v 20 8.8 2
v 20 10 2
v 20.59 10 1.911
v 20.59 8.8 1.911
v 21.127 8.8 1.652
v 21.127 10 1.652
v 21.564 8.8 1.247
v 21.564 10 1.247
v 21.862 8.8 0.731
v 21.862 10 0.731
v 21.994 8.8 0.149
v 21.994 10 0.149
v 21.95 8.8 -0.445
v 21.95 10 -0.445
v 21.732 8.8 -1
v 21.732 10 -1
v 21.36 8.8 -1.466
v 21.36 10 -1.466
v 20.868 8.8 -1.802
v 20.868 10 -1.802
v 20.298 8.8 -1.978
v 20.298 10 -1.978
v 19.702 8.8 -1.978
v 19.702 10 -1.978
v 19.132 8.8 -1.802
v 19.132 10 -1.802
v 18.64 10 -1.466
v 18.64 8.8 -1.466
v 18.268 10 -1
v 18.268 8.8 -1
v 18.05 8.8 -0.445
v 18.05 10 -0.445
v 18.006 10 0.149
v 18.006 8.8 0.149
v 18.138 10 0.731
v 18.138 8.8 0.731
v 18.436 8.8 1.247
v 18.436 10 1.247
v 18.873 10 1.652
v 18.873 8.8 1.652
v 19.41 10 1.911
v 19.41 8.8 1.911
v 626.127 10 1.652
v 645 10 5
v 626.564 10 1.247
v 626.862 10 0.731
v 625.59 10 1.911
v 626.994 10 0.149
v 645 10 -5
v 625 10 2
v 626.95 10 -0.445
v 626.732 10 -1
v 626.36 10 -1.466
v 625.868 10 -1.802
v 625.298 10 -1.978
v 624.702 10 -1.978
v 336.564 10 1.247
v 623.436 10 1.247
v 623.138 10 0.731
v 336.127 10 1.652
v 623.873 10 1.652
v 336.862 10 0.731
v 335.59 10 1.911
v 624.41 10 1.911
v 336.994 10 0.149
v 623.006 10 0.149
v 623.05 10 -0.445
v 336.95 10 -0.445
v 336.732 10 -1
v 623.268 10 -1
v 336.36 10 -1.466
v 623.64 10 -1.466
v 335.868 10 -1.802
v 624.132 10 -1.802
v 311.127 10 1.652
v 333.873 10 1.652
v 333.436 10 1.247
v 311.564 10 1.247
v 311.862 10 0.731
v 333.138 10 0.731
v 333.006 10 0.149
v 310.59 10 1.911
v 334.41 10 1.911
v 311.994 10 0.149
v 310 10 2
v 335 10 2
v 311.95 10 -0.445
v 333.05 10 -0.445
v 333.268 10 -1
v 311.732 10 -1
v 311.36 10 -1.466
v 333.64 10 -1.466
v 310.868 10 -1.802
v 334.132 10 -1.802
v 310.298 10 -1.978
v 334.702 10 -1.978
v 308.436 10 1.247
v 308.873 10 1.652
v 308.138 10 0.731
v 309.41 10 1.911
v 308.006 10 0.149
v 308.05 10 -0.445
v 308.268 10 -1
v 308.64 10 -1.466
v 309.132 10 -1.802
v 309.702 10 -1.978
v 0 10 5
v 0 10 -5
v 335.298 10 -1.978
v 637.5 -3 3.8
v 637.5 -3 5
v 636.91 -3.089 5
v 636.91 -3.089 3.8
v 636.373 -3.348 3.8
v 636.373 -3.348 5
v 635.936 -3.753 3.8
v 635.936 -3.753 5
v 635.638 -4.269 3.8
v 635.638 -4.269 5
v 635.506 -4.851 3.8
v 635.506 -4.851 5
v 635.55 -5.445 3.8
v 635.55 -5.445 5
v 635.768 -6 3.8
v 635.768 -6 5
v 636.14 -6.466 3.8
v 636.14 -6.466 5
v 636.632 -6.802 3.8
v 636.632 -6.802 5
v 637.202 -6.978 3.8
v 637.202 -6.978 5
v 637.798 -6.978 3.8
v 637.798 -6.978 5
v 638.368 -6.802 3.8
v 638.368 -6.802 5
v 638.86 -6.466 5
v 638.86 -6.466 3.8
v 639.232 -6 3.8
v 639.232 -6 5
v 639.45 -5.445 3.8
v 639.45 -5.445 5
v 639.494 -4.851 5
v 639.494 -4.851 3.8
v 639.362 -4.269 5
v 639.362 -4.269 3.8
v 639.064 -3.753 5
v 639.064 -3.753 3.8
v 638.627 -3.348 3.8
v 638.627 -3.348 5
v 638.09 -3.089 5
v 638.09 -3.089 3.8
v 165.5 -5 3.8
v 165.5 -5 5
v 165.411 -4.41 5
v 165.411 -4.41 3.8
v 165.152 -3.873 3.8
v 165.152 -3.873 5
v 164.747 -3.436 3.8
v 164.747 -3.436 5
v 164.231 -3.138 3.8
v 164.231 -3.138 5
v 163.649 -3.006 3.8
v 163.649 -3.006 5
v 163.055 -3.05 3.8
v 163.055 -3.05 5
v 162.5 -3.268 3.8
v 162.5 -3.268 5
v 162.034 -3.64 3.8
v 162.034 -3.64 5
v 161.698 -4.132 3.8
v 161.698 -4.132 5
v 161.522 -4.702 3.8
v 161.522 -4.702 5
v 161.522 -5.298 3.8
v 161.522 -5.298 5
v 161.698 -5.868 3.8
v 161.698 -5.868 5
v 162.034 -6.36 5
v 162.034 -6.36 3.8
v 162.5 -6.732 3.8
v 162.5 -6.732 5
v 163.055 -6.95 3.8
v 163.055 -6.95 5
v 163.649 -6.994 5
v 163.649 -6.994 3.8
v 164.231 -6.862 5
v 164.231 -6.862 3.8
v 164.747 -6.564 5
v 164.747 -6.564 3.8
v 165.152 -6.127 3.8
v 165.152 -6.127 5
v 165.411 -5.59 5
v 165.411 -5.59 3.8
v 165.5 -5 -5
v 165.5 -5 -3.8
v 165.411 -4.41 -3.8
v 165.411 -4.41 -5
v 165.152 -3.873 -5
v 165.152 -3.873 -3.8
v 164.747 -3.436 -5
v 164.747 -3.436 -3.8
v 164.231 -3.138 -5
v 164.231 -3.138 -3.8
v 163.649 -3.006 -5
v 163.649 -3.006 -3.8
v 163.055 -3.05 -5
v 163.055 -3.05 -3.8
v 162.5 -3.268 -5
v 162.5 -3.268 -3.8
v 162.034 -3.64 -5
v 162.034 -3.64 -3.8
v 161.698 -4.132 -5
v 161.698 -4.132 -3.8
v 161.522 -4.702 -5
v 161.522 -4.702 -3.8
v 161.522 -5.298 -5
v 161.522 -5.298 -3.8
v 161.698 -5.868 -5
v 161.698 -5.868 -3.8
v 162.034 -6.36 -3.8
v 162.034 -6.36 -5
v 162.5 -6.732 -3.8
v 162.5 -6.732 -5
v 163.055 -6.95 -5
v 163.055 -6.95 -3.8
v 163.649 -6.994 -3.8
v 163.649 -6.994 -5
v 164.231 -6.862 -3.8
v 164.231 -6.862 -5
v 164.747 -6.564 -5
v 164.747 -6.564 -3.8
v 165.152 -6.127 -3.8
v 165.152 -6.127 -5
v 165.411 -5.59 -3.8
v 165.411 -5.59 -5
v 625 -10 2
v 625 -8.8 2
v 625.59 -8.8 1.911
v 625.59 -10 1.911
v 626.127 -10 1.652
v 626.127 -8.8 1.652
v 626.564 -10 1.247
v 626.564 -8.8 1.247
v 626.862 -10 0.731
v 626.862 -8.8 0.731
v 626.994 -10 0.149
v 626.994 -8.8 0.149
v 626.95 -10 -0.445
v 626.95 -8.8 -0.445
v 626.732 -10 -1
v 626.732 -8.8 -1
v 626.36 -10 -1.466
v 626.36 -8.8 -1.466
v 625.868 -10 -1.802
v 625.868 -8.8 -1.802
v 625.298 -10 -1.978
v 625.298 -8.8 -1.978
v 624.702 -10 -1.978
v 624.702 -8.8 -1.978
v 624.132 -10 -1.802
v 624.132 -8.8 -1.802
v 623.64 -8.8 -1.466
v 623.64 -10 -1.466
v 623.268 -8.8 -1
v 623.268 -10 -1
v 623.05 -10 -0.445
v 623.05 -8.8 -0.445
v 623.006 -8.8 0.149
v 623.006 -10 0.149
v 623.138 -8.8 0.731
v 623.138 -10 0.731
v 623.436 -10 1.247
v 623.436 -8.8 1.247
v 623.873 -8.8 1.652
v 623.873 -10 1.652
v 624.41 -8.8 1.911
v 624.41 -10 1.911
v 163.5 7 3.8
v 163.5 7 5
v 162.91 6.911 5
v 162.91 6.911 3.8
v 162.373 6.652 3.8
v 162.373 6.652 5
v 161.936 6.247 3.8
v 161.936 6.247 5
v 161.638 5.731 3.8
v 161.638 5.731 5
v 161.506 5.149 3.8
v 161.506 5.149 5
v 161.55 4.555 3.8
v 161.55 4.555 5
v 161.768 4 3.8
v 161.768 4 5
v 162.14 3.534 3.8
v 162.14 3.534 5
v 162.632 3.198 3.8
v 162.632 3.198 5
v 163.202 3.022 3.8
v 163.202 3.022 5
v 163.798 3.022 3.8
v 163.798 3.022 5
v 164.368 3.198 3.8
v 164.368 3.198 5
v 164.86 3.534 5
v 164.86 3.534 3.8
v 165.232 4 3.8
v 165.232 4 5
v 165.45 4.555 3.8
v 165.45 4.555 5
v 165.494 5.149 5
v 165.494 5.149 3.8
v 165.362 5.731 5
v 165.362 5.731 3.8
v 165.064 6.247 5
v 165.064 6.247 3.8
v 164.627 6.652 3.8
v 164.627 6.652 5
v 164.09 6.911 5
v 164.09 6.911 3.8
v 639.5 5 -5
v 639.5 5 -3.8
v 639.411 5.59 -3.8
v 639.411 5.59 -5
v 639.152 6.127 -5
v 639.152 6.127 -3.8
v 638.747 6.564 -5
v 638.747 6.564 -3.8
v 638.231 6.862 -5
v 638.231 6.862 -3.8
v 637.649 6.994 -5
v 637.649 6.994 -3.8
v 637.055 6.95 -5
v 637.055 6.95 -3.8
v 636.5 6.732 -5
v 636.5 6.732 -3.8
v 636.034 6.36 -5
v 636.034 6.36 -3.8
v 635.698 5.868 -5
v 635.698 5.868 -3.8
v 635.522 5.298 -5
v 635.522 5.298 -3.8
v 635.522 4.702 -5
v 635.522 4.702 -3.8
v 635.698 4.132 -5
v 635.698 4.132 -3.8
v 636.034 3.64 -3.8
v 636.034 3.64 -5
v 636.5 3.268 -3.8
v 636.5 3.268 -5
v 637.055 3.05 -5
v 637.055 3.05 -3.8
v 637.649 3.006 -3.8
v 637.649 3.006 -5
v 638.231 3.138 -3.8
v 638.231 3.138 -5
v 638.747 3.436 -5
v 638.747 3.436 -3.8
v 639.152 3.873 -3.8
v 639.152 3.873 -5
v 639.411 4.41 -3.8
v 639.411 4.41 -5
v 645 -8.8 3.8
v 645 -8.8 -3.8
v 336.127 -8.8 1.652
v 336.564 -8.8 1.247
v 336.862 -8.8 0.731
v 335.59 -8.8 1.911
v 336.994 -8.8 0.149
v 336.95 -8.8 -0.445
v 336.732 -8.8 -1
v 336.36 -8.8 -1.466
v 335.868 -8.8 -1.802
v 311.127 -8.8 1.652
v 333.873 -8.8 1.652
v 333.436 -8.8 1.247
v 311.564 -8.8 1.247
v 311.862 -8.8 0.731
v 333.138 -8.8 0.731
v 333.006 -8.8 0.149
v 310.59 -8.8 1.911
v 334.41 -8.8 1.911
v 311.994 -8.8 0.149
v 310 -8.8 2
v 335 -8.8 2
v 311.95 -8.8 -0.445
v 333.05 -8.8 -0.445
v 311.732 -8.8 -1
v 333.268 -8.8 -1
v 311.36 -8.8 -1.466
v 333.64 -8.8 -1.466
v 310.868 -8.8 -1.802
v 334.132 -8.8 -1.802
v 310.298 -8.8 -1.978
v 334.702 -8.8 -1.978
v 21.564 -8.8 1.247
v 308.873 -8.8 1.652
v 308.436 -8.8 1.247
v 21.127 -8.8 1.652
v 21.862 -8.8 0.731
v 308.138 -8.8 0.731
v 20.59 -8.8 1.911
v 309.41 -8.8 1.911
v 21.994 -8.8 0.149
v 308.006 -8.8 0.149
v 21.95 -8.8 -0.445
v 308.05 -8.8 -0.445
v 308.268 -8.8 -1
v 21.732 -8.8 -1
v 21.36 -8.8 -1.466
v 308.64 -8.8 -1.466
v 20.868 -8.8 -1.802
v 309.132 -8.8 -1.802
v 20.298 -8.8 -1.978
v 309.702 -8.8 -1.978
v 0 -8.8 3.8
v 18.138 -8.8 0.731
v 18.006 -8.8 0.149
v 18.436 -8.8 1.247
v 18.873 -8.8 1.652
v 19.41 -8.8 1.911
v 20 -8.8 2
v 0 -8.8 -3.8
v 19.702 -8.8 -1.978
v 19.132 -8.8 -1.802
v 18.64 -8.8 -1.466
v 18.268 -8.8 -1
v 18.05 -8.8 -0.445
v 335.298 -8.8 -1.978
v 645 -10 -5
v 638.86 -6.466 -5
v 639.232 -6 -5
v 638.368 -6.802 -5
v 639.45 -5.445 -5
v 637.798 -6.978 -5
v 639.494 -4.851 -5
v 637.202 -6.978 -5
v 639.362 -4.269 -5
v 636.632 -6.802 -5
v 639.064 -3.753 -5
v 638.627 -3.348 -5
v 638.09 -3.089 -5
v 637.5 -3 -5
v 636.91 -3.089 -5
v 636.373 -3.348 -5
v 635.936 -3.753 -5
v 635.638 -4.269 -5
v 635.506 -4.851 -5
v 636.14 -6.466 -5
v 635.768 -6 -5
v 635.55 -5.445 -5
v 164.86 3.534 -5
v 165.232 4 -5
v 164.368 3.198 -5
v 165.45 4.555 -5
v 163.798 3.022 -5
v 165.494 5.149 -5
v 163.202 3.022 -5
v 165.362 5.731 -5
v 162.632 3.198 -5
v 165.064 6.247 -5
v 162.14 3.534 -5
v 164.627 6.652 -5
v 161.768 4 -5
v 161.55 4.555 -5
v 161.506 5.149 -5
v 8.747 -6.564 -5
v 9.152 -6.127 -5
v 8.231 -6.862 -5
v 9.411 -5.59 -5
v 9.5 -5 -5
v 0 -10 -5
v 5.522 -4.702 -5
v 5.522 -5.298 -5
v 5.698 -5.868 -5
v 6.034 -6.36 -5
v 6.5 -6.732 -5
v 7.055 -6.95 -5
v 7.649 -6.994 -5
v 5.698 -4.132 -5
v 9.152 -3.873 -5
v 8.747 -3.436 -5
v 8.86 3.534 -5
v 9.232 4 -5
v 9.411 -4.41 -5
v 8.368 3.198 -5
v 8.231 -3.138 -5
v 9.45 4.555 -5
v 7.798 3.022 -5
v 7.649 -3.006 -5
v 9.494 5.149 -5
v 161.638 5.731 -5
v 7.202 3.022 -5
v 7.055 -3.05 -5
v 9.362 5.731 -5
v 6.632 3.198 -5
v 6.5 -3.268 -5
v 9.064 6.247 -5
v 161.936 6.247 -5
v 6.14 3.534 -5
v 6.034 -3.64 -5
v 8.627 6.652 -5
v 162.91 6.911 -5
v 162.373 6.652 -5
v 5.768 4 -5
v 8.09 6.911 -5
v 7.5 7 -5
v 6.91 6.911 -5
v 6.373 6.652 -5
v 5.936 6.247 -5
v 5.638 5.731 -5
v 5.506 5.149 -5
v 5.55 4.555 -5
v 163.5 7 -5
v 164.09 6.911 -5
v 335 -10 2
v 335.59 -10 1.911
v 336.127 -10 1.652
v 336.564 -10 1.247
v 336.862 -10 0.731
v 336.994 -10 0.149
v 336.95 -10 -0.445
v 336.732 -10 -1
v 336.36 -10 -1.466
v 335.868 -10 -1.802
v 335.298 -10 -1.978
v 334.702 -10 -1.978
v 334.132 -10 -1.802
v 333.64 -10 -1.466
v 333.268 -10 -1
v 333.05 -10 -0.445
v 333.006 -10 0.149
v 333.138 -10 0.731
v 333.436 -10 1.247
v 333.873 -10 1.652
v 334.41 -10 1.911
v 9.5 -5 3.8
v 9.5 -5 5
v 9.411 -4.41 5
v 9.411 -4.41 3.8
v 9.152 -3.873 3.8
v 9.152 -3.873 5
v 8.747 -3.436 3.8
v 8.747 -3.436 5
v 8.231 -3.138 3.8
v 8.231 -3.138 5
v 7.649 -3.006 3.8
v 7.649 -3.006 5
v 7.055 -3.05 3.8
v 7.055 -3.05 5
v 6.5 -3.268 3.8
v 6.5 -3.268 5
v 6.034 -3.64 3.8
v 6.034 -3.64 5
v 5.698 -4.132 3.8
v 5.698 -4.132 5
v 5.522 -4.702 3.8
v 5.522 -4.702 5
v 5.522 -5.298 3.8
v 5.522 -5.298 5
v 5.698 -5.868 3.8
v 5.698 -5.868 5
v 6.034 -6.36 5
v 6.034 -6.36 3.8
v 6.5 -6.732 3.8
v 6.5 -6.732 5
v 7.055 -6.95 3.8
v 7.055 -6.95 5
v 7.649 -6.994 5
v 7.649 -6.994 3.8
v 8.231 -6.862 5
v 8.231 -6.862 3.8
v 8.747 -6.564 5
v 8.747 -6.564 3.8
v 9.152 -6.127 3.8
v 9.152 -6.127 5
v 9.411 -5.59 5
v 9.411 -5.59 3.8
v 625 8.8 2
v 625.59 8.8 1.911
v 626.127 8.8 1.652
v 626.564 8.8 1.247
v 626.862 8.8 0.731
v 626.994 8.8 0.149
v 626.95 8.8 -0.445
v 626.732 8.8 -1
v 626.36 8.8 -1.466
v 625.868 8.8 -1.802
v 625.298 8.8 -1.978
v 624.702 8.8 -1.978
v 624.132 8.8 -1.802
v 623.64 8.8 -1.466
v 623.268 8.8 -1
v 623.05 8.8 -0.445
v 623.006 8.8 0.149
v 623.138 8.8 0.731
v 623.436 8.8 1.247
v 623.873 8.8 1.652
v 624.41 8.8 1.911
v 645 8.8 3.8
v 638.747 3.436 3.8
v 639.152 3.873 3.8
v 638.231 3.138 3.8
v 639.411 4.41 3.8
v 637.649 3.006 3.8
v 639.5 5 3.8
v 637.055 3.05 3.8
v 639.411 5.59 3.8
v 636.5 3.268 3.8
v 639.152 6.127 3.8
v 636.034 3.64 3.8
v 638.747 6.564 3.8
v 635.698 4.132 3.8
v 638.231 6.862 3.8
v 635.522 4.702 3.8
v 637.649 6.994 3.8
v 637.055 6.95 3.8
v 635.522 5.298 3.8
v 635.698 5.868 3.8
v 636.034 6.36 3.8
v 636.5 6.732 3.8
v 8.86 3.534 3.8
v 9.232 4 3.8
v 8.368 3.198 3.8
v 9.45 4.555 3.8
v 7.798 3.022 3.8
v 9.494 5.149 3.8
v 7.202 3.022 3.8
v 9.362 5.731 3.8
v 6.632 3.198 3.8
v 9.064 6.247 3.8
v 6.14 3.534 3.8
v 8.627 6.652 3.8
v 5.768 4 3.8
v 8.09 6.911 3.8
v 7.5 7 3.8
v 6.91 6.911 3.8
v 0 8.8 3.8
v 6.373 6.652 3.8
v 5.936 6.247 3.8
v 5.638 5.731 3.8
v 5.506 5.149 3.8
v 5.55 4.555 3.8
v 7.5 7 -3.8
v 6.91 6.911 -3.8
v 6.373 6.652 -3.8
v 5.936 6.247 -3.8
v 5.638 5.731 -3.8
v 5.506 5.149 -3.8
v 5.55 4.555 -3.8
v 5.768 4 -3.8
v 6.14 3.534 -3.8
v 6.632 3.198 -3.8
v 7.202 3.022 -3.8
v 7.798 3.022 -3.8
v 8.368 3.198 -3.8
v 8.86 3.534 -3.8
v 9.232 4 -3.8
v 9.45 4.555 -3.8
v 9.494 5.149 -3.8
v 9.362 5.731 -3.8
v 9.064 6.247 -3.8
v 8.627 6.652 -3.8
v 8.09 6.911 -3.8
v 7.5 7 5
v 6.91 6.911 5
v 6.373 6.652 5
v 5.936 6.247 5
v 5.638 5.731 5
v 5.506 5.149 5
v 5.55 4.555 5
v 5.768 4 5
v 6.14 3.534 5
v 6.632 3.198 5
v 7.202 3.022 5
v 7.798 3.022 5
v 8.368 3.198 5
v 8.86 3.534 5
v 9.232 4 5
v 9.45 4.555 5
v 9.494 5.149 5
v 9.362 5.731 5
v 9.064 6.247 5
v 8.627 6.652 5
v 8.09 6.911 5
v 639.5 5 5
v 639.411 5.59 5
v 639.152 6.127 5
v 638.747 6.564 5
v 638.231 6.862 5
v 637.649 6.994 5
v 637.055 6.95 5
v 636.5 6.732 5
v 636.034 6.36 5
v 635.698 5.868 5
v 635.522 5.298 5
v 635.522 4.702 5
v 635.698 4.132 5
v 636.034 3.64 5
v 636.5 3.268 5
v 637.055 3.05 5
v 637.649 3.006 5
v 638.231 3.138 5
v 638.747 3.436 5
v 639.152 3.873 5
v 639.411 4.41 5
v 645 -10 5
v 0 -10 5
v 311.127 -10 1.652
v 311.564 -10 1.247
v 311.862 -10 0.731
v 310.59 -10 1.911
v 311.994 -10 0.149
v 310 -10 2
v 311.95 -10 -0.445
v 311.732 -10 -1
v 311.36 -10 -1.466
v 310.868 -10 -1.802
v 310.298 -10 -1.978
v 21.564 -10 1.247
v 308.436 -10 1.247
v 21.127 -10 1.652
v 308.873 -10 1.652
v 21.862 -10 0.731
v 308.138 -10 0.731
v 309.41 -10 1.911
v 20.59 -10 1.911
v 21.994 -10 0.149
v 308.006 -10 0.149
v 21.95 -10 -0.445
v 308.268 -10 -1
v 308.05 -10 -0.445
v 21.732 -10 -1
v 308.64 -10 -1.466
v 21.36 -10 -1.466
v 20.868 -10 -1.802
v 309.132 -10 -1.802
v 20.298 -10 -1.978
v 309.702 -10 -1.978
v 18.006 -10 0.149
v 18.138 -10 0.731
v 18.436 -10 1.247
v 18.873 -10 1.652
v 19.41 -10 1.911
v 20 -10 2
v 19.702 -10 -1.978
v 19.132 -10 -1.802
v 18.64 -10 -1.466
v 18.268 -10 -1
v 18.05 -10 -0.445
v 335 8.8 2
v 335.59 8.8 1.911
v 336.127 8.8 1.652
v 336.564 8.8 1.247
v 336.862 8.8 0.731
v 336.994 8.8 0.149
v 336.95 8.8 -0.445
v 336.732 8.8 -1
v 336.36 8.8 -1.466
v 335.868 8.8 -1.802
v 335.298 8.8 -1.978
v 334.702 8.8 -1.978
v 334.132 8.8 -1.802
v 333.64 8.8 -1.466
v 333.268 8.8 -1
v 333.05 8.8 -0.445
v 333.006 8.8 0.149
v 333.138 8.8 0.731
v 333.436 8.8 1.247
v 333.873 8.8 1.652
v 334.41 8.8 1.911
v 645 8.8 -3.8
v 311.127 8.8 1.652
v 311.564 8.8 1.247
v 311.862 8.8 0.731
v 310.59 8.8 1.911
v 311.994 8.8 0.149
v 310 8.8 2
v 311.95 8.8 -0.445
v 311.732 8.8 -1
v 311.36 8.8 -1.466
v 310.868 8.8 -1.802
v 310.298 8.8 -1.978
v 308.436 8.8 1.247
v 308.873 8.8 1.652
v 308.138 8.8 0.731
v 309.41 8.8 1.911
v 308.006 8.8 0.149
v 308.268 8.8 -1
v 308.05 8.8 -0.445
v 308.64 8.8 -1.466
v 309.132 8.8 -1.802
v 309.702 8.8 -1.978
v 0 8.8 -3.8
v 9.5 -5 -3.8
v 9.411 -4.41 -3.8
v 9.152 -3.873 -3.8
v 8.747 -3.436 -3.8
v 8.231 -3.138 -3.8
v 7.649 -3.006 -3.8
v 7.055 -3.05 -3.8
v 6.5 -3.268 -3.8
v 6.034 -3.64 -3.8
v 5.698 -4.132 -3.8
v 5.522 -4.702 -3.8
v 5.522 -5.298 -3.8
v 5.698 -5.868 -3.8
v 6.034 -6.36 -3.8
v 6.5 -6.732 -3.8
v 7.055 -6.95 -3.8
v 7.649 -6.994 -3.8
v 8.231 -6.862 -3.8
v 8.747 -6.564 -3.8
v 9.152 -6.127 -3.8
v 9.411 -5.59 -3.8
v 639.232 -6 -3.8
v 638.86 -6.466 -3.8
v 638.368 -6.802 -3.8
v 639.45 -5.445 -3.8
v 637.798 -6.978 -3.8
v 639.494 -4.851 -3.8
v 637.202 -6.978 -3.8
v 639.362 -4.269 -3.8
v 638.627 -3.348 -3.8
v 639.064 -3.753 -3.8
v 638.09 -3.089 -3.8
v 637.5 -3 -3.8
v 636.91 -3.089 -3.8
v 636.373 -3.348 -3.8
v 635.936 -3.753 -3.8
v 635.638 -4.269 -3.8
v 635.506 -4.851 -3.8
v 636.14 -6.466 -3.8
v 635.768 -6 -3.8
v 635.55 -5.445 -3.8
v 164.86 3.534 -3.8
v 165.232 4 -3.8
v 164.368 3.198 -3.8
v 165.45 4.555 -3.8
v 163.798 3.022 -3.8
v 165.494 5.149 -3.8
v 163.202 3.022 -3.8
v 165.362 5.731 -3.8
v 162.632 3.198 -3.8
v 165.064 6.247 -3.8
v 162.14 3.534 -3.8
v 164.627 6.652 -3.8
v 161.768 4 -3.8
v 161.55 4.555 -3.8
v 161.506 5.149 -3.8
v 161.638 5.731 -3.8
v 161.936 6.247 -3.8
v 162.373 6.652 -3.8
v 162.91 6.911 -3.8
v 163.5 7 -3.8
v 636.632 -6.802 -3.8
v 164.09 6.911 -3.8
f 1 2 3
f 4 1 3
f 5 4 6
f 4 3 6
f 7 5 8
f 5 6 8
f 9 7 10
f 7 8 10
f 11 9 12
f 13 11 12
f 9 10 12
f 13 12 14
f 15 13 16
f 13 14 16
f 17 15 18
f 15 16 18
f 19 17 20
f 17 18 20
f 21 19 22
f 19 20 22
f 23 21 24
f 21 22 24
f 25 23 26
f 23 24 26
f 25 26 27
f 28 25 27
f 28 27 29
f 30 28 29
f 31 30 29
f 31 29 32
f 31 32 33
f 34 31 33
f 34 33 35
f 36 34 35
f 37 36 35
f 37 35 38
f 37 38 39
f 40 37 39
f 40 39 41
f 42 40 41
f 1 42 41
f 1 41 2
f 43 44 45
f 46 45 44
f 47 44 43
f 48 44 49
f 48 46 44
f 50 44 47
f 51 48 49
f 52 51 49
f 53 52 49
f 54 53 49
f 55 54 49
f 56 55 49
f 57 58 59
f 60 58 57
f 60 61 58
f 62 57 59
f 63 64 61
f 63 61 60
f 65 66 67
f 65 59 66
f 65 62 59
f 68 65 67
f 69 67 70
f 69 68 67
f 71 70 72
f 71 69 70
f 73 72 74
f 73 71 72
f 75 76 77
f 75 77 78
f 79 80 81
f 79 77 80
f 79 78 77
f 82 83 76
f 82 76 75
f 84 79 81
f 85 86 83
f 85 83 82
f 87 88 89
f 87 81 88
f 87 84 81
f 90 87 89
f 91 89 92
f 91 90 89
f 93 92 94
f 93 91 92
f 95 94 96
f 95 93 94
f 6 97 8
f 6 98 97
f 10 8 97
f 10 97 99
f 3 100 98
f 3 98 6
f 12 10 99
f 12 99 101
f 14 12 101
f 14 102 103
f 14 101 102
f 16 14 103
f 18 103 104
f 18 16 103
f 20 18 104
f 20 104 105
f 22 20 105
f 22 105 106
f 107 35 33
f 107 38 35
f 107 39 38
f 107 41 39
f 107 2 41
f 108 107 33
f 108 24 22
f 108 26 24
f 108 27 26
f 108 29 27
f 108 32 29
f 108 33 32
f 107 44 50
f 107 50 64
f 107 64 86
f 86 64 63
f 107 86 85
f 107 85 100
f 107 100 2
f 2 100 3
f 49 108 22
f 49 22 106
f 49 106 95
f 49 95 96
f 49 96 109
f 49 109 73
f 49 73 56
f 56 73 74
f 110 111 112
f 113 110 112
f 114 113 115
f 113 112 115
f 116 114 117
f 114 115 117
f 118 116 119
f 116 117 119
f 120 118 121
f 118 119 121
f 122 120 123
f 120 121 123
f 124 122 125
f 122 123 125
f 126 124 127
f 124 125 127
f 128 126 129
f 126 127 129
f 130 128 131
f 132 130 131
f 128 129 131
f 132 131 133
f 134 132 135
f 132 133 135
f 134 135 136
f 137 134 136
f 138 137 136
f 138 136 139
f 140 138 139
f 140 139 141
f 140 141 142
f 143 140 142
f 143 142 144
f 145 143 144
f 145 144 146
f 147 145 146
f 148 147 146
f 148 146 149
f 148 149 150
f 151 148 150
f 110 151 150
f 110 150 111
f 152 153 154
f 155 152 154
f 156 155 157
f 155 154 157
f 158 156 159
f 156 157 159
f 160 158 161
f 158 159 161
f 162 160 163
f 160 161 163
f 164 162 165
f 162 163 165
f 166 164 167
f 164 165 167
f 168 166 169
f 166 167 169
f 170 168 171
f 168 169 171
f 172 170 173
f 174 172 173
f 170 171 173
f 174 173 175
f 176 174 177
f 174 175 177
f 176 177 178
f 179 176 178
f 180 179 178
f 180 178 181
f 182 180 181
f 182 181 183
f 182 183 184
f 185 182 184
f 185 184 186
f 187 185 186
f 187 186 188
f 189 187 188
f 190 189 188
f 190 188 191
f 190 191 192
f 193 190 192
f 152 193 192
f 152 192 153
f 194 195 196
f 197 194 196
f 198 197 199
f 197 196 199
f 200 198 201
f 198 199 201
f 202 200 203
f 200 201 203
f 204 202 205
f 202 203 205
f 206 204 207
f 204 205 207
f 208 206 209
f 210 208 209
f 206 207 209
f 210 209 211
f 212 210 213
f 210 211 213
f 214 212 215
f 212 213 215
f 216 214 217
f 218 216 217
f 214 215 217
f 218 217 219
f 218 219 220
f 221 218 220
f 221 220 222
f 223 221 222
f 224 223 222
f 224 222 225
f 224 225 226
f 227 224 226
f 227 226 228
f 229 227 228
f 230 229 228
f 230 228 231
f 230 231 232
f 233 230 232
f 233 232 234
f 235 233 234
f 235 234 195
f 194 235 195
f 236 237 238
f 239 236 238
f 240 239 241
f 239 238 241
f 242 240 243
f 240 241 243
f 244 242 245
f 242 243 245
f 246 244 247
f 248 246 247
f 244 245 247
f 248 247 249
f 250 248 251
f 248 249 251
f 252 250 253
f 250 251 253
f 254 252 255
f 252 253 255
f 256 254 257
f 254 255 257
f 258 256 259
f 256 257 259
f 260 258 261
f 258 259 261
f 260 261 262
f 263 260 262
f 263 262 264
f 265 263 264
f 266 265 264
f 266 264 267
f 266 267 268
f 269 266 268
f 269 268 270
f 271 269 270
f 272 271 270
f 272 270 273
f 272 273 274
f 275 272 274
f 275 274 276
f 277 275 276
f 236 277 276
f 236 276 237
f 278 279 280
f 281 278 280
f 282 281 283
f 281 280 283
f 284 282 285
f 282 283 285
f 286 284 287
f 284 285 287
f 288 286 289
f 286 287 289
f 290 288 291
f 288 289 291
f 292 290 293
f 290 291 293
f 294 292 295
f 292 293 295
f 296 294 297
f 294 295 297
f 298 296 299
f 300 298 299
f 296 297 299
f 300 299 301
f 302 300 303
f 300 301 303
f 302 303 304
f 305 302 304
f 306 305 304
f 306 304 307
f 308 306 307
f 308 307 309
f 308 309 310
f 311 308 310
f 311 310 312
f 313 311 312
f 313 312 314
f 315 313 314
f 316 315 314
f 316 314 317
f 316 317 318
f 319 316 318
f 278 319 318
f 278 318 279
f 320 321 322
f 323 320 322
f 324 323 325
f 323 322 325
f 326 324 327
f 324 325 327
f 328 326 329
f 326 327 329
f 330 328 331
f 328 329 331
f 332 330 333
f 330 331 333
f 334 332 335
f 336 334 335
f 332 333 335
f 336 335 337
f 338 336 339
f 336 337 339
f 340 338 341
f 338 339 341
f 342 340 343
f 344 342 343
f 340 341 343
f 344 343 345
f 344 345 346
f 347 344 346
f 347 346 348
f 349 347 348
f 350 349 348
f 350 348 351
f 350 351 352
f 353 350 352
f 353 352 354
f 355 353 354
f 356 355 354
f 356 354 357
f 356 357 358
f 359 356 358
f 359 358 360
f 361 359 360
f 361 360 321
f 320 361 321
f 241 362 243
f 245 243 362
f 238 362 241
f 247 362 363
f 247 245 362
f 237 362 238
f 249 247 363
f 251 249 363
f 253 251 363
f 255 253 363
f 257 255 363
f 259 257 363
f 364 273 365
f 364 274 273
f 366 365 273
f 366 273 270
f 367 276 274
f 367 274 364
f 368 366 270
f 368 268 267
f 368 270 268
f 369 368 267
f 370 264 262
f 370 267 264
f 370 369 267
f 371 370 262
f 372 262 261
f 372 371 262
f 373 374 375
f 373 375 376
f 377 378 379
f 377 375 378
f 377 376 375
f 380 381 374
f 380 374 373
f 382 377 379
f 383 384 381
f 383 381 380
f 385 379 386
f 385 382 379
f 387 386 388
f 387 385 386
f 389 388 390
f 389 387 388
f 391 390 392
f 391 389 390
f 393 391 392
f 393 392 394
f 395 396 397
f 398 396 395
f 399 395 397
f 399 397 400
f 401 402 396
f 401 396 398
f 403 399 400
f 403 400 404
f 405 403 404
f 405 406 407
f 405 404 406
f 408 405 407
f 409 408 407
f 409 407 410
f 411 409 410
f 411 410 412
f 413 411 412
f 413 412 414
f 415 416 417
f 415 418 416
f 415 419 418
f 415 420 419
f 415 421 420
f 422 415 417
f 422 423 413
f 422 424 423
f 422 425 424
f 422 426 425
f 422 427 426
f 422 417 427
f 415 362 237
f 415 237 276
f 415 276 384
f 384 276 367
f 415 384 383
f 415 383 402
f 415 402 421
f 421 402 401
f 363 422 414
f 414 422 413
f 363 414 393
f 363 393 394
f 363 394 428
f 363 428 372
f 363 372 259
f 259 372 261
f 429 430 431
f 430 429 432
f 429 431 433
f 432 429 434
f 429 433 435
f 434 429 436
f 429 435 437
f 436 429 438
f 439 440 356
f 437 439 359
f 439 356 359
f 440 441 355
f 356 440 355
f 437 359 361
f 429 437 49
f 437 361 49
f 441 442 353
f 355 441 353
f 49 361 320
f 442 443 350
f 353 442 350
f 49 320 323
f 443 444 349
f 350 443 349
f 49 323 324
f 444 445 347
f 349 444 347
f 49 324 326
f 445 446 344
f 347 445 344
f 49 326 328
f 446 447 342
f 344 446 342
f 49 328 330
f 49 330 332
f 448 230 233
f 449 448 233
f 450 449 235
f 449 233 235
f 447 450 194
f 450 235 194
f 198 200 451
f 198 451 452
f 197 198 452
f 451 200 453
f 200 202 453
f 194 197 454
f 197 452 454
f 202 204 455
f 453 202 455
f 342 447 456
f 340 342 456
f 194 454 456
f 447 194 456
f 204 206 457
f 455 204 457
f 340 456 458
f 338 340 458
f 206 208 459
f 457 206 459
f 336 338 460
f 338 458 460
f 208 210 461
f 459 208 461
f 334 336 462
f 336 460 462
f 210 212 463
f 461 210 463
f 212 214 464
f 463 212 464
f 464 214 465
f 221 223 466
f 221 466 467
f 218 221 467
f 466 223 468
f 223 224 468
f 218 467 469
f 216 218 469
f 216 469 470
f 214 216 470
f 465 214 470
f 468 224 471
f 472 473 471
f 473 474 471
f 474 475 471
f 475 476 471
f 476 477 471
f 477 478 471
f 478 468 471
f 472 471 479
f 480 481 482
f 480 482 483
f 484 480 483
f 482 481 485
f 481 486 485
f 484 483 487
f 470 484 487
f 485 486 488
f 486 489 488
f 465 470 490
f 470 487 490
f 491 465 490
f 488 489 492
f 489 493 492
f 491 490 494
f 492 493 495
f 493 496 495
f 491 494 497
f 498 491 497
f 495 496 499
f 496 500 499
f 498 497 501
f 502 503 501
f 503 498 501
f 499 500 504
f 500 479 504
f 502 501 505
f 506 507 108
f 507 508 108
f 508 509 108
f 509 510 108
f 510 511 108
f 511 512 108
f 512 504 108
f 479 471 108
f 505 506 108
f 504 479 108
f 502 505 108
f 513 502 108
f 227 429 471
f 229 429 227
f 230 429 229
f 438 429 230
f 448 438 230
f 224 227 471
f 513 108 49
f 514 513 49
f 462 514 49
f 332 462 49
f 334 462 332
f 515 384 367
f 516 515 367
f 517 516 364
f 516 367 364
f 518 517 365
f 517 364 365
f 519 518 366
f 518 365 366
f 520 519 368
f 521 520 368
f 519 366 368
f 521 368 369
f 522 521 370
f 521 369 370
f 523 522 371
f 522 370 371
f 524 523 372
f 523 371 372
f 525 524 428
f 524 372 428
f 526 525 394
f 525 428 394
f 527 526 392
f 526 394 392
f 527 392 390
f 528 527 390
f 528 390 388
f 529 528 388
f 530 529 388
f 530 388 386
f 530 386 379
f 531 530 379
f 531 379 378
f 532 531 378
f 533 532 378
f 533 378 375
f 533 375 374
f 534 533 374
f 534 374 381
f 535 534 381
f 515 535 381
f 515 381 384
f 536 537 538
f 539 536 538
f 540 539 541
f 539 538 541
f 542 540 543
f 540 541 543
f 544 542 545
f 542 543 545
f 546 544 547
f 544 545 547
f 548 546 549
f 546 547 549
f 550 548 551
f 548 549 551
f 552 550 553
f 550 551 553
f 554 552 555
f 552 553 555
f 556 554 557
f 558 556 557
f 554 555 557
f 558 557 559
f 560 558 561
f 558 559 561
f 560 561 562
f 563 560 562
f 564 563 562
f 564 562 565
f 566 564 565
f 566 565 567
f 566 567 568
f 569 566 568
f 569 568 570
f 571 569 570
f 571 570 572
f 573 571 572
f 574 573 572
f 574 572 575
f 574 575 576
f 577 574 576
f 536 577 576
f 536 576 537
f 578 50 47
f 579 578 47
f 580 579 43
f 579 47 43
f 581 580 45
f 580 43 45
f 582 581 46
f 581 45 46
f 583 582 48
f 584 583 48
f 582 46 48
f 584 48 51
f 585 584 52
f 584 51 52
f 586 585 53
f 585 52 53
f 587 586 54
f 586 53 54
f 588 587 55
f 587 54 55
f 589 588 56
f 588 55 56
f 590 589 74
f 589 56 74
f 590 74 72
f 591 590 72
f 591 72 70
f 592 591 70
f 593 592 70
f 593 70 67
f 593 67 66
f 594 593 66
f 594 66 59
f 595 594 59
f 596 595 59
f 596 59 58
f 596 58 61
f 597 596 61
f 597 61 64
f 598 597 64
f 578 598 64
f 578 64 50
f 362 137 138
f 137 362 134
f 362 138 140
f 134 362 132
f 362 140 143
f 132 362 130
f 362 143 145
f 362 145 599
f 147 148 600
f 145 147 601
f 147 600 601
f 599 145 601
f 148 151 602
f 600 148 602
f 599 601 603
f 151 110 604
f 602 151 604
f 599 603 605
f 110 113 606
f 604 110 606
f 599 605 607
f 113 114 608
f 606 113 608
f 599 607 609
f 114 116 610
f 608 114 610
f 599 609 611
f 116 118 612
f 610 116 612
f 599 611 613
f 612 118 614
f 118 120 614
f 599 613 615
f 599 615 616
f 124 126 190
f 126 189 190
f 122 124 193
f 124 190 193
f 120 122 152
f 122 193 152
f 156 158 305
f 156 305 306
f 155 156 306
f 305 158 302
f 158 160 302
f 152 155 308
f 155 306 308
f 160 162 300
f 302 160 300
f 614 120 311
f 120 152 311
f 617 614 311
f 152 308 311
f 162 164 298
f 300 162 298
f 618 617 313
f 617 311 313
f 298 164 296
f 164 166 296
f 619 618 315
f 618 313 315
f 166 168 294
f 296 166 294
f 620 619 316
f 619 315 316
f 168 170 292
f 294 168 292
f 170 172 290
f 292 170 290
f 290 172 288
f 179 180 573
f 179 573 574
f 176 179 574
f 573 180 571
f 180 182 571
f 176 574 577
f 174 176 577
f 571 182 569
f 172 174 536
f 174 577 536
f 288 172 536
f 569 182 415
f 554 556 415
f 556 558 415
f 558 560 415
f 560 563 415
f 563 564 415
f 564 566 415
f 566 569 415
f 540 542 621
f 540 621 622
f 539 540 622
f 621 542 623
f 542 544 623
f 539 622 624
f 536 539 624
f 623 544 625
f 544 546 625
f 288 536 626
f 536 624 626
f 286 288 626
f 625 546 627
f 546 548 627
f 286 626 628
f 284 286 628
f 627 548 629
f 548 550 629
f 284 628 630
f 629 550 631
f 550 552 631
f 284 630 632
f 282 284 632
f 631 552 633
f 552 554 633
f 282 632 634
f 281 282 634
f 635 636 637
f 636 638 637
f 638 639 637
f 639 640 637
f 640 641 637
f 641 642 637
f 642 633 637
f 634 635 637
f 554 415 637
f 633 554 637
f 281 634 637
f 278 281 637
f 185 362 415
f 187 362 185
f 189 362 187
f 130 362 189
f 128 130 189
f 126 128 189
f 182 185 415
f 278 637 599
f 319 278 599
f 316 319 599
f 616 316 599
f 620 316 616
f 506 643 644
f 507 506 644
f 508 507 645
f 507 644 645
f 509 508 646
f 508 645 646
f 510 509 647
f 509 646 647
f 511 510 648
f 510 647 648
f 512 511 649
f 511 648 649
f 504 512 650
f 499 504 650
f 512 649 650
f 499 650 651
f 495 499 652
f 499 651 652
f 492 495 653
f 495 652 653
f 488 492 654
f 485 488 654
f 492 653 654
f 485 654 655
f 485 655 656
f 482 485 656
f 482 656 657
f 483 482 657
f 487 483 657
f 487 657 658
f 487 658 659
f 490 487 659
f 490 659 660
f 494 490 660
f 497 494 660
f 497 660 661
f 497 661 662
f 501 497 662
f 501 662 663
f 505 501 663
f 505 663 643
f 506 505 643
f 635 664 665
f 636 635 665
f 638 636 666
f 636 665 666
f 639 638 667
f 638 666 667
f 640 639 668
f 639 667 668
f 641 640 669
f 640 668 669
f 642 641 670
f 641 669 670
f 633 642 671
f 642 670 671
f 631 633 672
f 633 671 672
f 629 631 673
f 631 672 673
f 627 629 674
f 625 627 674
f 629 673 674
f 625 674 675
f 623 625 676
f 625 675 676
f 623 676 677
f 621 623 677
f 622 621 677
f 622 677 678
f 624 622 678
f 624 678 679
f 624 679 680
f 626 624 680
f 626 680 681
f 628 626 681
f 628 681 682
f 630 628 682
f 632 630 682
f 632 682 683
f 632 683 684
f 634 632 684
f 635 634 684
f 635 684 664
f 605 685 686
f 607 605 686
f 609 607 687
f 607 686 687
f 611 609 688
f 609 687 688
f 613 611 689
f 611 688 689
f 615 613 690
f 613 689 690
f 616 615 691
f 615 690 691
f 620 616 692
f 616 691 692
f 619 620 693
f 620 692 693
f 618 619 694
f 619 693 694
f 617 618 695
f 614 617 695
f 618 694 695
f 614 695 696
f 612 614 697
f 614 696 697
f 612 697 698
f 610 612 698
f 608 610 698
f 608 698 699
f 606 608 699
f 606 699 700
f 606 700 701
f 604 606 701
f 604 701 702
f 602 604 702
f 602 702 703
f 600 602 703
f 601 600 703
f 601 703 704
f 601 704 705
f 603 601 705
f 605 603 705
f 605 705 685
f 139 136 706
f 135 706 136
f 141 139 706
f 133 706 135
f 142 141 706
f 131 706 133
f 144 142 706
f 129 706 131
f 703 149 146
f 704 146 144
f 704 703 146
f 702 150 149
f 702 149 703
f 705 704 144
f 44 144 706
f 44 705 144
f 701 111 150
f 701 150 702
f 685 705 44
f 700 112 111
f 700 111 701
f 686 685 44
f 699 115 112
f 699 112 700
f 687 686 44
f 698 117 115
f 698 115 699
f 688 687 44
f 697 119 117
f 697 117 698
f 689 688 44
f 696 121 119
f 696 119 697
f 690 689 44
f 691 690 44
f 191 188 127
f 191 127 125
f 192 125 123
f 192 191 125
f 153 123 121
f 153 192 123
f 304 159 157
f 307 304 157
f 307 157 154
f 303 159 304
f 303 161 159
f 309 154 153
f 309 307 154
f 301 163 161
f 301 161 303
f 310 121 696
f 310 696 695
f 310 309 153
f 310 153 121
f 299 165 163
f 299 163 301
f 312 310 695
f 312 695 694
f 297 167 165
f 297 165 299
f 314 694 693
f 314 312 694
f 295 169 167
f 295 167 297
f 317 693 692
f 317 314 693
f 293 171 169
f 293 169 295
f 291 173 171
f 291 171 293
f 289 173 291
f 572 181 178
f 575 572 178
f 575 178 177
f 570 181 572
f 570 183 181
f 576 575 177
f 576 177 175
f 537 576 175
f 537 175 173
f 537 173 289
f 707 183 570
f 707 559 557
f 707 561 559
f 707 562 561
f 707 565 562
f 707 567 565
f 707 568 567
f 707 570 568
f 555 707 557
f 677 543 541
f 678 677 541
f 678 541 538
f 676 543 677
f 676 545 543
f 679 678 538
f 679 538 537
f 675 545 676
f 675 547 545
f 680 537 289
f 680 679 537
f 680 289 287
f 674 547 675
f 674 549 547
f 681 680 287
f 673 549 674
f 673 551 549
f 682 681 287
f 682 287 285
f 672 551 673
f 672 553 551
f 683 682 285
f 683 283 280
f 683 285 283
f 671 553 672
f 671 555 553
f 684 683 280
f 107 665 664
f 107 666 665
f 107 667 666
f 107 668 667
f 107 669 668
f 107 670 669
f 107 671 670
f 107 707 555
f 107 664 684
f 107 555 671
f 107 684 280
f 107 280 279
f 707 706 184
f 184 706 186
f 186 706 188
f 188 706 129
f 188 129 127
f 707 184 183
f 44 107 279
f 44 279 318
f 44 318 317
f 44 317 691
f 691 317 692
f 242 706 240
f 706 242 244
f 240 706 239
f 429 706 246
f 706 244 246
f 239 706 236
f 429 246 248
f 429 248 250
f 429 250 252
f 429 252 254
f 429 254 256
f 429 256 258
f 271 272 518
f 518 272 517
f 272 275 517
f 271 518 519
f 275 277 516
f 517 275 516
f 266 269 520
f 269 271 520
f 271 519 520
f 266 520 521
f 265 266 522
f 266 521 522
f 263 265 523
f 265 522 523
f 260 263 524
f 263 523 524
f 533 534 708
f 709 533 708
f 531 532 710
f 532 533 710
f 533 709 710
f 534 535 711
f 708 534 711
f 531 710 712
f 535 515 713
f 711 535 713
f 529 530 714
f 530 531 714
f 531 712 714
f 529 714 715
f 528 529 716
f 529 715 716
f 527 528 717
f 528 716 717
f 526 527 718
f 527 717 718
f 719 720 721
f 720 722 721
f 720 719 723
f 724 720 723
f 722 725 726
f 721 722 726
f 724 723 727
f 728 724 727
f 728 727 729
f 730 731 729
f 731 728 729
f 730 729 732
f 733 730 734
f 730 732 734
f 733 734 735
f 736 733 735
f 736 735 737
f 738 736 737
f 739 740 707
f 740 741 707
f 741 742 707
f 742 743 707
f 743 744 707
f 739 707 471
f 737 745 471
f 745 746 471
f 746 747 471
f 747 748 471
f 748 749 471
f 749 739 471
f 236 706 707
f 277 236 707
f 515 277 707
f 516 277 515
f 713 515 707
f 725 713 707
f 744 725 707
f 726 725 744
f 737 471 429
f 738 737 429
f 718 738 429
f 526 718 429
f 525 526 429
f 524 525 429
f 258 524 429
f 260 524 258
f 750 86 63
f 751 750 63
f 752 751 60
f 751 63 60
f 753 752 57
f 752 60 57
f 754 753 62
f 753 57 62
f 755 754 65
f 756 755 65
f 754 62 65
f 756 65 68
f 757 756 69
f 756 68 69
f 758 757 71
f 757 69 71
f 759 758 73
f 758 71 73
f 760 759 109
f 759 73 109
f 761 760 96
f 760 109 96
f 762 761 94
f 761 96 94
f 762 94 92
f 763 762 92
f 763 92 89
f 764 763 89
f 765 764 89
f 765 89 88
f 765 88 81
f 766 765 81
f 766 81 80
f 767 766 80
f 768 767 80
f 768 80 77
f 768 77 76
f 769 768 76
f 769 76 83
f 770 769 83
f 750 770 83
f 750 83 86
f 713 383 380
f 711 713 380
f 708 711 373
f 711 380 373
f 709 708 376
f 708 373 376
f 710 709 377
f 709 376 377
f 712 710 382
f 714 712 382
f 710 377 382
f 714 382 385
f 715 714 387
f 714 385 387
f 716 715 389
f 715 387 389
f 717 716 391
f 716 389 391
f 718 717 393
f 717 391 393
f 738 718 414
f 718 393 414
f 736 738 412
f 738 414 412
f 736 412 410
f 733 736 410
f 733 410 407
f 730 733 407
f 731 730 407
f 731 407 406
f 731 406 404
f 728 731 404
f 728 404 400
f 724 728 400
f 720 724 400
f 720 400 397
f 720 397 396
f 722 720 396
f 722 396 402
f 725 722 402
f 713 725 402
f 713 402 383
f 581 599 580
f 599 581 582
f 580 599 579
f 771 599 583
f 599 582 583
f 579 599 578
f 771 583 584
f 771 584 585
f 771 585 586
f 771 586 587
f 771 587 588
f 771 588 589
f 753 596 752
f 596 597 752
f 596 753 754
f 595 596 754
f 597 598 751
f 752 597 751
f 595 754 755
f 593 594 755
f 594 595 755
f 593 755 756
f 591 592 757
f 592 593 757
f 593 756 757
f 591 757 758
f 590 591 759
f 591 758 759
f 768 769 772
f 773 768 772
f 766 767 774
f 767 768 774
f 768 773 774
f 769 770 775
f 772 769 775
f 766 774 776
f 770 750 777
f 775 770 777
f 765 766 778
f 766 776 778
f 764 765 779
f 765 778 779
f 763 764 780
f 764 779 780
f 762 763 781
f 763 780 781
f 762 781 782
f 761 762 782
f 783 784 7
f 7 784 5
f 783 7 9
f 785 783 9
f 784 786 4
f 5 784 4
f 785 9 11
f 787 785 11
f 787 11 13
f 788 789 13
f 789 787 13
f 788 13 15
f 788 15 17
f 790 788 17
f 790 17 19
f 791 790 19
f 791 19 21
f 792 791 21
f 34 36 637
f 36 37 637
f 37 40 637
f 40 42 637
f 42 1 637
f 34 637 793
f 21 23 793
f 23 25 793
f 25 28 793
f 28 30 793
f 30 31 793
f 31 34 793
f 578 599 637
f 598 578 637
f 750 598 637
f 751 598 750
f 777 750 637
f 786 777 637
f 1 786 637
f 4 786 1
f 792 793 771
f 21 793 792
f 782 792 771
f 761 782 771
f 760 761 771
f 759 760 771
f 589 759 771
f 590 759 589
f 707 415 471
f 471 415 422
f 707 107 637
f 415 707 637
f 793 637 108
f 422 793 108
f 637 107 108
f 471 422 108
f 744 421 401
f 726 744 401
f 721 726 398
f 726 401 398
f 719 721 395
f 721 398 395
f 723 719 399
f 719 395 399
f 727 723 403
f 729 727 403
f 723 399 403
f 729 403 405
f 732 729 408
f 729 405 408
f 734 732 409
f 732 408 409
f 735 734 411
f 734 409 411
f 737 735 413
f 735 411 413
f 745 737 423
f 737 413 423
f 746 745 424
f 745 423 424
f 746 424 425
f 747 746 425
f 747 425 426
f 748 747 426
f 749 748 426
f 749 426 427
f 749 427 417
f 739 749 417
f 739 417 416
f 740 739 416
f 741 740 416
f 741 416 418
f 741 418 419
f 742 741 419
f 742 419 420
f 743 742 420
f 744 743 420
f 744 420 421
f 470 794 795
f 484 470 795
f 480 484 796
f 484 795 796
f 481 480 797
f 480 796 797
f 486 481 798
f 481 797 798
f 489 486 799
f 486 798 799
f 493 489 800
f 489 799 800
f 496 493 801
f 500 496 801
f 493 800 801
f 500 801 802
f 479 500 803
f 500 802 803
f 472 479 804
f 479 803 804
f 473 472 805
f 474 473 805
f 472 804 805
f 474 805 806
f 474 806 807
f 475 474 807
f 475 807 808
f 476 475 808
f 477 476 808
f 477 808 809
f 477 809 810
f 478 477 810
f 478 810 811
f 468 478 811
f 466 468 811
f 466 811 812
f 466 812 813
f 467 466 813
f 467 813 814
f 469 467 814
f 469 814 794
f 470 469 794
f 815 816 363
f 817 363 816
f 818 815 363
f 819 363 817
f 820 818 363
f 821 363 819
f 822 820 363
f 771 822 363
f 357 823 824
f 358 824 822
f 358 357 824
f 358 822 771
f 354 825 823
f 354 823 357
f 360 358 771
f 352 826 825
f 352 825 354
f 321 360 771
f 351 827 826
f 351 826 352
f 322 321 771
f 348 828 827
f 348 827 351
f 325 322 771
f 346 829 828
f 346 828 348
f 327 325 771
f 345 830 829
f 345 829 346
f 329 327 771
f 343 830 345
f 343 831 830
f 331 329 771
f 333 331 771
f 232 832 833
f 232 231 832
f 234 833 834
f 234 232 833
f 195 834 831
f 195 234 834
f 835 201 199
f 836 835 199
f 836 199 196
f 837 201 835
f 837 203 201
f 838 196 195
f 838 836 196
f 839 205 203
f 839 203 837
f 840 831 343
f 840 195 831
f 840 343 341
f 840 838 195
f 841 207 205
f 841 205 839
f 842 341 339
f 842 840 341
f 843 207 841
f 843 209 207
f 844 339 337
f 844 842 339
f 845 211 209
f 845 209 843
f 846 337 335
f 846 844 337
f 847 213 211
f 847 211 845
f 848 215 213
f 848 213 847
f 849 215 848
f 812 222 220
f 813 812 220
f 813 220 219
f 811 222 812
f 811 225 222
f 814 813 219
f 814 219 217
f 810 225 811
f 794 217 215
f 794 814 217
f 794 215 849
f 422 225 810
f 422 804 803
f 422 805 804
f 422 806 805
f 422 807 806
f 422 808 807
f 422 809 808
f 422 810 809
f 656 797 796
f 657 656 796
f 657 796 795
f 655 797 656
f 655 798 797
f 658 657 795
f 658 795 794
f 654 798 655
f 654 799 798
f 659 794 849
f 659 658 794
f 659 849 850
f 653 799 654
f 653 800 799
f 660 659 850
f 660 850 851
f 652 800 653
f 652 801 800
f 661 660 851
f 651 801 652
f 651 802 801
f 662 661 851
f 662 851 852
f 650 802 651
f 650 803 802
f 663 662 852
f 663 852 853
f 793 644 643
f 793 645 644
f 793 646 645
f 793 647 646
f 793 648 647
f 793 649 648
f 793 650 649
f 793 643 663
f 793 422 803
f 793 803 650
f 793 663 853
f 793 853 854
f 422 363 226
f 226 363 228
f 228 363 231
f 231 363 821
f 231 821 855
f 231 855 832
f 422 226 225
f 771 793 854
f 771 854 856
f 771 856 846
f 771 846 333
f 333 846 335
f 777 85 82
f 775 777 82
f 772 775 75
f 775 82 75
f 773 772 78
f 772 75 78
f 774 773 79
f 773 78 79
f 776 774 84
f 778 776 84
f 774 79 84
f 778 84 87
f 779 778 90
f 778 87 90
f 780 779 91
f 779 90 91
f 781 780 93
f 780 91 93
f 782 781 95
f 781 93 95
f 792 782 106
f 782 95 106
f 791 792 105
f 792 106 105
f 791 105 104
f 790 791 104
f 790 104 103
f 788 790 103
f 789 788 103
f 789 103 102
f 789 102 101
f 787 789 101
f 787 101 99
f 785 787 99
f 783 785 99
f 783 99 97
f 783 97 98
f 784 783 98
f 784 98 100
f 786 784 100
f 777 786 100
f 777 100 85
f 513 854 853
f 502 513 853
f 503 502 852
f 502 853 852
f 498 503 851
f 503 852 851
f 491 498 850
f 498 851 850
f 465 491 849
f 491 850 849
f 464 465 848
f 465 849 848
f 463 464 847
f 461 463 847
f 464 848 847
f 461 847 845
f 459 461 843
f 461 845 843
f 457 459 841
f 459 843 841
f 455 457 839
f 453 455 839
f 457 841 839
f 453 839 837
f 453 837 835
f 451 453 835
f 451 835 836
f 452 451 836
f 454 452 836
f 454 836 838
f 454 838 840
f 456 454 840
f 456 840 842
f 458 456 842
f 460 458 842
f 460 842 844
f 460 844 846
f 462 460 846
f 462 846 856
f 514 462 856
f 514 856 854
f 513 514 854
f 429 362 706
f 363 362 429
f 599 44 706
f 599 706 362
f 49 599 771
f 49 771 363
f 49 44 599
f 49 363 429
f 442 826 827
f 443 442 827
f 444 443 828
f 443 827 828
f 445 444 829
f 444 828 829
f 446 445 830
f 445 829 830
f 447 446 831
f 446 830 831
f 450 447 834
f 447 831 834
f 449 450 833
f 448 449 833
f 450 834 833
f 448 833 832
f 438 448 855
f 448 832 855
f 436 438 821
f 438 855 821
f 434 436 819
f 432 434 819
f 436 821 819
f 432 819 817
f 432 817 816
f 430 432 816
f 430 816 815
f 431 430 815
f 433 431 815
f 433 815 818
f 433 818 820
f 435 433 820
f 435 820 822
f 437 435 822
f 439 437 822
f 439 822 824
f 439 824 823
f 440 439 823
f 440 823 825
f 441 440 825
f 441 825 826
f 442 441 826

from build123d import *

# Parameters (mm, degrees)
SKETCH_1_W          = 10
SKETCH_1_H          = 20
SKETCH_1_W_2        = 7.6
SKETCH_1_H_2        = 17.6
EXTRUDE_1_DEPTH     = 645
SKETCH_2_R          = 2
CUT_EXTRUDE_1_DEPTH = 646.155020131
SKETCH_3_R          = 2
CUT_EXTRUDE_2_DEPTH = 646.329373266


with BuildPart() as part:
    # ｽｹｯﾁ1 → 押し出し-薄板1 (new body)
    with BuildSketch(Plane(origin=(0, 0, 0), x_dir=(0, 0, -1), z_dir=(1, 0, 0))):
        Rectangle(SKETCH_1_W, SKETCH_1_H)
        Rectangle(SKETCH_1_W_2, SKETCH_1_H_2, mode=Mode.SUBTRACT)
    extrude(amount=EXTRUDE_1_DEPTH)

    # ｽｹｯﾁ2 → ｶｯﾄ - 押し出し1 (cut, through all)
    with BuildSketch(Plane.XY.offset(5)):
        with Locations((163.5, -5)):
            Circle(SKETCH_2_R)
        with Locations(Location((163.5, 5, 0), (0, 0, 90))):
            Circle(SKETCH_2_R)
        with Locations((637.5, 5)):
            Circle(SKETCH_2_R)
        with Locations(Location((637.5, -5, 0), (0, 0, 90))):
            Circle(SKETCH_2_R)
        with Locations((7.5, -5)):
            Circle(SKETCH_2_R)
        with Locations(Location((7.5, 5, 0), (0, 0, 90))):
            Circle(SKETCH_2_R)
    extrude(amount=-CUT_EXTRUDE_1_DEPTH, mode=Mode.SUBTRACT)

    # ｽｹｯﾁ3 → ｶｯﾄ - 押し出し2 (cut, through all)
    with BuildSketch(Plane(origin=(0, 10, 0), x_dir=(1, 0, 0), z_dir=(0, 1, 0))):
        with Locations(Location((20, 0, 0), (0, 0, 270))):
            Circle(SKETCH_3_R)
        with Locations(Location((625, 0, 0), (0, 0, 270))):
            Circle(SKETCH_3_R)
        with Locations(Location((310, 0, 0), (0, 0, 270))):
            Circle(SKETCH_3_R)
        with Locations(Location((335, 0, 0), (0, 0, 270))):
            Circle(SKETCH_3_R)
    extrude(amount=-CUT_EXTRUDE_2_DEPTH, mode=Mode.SUBTRACT)


solid = part.part
